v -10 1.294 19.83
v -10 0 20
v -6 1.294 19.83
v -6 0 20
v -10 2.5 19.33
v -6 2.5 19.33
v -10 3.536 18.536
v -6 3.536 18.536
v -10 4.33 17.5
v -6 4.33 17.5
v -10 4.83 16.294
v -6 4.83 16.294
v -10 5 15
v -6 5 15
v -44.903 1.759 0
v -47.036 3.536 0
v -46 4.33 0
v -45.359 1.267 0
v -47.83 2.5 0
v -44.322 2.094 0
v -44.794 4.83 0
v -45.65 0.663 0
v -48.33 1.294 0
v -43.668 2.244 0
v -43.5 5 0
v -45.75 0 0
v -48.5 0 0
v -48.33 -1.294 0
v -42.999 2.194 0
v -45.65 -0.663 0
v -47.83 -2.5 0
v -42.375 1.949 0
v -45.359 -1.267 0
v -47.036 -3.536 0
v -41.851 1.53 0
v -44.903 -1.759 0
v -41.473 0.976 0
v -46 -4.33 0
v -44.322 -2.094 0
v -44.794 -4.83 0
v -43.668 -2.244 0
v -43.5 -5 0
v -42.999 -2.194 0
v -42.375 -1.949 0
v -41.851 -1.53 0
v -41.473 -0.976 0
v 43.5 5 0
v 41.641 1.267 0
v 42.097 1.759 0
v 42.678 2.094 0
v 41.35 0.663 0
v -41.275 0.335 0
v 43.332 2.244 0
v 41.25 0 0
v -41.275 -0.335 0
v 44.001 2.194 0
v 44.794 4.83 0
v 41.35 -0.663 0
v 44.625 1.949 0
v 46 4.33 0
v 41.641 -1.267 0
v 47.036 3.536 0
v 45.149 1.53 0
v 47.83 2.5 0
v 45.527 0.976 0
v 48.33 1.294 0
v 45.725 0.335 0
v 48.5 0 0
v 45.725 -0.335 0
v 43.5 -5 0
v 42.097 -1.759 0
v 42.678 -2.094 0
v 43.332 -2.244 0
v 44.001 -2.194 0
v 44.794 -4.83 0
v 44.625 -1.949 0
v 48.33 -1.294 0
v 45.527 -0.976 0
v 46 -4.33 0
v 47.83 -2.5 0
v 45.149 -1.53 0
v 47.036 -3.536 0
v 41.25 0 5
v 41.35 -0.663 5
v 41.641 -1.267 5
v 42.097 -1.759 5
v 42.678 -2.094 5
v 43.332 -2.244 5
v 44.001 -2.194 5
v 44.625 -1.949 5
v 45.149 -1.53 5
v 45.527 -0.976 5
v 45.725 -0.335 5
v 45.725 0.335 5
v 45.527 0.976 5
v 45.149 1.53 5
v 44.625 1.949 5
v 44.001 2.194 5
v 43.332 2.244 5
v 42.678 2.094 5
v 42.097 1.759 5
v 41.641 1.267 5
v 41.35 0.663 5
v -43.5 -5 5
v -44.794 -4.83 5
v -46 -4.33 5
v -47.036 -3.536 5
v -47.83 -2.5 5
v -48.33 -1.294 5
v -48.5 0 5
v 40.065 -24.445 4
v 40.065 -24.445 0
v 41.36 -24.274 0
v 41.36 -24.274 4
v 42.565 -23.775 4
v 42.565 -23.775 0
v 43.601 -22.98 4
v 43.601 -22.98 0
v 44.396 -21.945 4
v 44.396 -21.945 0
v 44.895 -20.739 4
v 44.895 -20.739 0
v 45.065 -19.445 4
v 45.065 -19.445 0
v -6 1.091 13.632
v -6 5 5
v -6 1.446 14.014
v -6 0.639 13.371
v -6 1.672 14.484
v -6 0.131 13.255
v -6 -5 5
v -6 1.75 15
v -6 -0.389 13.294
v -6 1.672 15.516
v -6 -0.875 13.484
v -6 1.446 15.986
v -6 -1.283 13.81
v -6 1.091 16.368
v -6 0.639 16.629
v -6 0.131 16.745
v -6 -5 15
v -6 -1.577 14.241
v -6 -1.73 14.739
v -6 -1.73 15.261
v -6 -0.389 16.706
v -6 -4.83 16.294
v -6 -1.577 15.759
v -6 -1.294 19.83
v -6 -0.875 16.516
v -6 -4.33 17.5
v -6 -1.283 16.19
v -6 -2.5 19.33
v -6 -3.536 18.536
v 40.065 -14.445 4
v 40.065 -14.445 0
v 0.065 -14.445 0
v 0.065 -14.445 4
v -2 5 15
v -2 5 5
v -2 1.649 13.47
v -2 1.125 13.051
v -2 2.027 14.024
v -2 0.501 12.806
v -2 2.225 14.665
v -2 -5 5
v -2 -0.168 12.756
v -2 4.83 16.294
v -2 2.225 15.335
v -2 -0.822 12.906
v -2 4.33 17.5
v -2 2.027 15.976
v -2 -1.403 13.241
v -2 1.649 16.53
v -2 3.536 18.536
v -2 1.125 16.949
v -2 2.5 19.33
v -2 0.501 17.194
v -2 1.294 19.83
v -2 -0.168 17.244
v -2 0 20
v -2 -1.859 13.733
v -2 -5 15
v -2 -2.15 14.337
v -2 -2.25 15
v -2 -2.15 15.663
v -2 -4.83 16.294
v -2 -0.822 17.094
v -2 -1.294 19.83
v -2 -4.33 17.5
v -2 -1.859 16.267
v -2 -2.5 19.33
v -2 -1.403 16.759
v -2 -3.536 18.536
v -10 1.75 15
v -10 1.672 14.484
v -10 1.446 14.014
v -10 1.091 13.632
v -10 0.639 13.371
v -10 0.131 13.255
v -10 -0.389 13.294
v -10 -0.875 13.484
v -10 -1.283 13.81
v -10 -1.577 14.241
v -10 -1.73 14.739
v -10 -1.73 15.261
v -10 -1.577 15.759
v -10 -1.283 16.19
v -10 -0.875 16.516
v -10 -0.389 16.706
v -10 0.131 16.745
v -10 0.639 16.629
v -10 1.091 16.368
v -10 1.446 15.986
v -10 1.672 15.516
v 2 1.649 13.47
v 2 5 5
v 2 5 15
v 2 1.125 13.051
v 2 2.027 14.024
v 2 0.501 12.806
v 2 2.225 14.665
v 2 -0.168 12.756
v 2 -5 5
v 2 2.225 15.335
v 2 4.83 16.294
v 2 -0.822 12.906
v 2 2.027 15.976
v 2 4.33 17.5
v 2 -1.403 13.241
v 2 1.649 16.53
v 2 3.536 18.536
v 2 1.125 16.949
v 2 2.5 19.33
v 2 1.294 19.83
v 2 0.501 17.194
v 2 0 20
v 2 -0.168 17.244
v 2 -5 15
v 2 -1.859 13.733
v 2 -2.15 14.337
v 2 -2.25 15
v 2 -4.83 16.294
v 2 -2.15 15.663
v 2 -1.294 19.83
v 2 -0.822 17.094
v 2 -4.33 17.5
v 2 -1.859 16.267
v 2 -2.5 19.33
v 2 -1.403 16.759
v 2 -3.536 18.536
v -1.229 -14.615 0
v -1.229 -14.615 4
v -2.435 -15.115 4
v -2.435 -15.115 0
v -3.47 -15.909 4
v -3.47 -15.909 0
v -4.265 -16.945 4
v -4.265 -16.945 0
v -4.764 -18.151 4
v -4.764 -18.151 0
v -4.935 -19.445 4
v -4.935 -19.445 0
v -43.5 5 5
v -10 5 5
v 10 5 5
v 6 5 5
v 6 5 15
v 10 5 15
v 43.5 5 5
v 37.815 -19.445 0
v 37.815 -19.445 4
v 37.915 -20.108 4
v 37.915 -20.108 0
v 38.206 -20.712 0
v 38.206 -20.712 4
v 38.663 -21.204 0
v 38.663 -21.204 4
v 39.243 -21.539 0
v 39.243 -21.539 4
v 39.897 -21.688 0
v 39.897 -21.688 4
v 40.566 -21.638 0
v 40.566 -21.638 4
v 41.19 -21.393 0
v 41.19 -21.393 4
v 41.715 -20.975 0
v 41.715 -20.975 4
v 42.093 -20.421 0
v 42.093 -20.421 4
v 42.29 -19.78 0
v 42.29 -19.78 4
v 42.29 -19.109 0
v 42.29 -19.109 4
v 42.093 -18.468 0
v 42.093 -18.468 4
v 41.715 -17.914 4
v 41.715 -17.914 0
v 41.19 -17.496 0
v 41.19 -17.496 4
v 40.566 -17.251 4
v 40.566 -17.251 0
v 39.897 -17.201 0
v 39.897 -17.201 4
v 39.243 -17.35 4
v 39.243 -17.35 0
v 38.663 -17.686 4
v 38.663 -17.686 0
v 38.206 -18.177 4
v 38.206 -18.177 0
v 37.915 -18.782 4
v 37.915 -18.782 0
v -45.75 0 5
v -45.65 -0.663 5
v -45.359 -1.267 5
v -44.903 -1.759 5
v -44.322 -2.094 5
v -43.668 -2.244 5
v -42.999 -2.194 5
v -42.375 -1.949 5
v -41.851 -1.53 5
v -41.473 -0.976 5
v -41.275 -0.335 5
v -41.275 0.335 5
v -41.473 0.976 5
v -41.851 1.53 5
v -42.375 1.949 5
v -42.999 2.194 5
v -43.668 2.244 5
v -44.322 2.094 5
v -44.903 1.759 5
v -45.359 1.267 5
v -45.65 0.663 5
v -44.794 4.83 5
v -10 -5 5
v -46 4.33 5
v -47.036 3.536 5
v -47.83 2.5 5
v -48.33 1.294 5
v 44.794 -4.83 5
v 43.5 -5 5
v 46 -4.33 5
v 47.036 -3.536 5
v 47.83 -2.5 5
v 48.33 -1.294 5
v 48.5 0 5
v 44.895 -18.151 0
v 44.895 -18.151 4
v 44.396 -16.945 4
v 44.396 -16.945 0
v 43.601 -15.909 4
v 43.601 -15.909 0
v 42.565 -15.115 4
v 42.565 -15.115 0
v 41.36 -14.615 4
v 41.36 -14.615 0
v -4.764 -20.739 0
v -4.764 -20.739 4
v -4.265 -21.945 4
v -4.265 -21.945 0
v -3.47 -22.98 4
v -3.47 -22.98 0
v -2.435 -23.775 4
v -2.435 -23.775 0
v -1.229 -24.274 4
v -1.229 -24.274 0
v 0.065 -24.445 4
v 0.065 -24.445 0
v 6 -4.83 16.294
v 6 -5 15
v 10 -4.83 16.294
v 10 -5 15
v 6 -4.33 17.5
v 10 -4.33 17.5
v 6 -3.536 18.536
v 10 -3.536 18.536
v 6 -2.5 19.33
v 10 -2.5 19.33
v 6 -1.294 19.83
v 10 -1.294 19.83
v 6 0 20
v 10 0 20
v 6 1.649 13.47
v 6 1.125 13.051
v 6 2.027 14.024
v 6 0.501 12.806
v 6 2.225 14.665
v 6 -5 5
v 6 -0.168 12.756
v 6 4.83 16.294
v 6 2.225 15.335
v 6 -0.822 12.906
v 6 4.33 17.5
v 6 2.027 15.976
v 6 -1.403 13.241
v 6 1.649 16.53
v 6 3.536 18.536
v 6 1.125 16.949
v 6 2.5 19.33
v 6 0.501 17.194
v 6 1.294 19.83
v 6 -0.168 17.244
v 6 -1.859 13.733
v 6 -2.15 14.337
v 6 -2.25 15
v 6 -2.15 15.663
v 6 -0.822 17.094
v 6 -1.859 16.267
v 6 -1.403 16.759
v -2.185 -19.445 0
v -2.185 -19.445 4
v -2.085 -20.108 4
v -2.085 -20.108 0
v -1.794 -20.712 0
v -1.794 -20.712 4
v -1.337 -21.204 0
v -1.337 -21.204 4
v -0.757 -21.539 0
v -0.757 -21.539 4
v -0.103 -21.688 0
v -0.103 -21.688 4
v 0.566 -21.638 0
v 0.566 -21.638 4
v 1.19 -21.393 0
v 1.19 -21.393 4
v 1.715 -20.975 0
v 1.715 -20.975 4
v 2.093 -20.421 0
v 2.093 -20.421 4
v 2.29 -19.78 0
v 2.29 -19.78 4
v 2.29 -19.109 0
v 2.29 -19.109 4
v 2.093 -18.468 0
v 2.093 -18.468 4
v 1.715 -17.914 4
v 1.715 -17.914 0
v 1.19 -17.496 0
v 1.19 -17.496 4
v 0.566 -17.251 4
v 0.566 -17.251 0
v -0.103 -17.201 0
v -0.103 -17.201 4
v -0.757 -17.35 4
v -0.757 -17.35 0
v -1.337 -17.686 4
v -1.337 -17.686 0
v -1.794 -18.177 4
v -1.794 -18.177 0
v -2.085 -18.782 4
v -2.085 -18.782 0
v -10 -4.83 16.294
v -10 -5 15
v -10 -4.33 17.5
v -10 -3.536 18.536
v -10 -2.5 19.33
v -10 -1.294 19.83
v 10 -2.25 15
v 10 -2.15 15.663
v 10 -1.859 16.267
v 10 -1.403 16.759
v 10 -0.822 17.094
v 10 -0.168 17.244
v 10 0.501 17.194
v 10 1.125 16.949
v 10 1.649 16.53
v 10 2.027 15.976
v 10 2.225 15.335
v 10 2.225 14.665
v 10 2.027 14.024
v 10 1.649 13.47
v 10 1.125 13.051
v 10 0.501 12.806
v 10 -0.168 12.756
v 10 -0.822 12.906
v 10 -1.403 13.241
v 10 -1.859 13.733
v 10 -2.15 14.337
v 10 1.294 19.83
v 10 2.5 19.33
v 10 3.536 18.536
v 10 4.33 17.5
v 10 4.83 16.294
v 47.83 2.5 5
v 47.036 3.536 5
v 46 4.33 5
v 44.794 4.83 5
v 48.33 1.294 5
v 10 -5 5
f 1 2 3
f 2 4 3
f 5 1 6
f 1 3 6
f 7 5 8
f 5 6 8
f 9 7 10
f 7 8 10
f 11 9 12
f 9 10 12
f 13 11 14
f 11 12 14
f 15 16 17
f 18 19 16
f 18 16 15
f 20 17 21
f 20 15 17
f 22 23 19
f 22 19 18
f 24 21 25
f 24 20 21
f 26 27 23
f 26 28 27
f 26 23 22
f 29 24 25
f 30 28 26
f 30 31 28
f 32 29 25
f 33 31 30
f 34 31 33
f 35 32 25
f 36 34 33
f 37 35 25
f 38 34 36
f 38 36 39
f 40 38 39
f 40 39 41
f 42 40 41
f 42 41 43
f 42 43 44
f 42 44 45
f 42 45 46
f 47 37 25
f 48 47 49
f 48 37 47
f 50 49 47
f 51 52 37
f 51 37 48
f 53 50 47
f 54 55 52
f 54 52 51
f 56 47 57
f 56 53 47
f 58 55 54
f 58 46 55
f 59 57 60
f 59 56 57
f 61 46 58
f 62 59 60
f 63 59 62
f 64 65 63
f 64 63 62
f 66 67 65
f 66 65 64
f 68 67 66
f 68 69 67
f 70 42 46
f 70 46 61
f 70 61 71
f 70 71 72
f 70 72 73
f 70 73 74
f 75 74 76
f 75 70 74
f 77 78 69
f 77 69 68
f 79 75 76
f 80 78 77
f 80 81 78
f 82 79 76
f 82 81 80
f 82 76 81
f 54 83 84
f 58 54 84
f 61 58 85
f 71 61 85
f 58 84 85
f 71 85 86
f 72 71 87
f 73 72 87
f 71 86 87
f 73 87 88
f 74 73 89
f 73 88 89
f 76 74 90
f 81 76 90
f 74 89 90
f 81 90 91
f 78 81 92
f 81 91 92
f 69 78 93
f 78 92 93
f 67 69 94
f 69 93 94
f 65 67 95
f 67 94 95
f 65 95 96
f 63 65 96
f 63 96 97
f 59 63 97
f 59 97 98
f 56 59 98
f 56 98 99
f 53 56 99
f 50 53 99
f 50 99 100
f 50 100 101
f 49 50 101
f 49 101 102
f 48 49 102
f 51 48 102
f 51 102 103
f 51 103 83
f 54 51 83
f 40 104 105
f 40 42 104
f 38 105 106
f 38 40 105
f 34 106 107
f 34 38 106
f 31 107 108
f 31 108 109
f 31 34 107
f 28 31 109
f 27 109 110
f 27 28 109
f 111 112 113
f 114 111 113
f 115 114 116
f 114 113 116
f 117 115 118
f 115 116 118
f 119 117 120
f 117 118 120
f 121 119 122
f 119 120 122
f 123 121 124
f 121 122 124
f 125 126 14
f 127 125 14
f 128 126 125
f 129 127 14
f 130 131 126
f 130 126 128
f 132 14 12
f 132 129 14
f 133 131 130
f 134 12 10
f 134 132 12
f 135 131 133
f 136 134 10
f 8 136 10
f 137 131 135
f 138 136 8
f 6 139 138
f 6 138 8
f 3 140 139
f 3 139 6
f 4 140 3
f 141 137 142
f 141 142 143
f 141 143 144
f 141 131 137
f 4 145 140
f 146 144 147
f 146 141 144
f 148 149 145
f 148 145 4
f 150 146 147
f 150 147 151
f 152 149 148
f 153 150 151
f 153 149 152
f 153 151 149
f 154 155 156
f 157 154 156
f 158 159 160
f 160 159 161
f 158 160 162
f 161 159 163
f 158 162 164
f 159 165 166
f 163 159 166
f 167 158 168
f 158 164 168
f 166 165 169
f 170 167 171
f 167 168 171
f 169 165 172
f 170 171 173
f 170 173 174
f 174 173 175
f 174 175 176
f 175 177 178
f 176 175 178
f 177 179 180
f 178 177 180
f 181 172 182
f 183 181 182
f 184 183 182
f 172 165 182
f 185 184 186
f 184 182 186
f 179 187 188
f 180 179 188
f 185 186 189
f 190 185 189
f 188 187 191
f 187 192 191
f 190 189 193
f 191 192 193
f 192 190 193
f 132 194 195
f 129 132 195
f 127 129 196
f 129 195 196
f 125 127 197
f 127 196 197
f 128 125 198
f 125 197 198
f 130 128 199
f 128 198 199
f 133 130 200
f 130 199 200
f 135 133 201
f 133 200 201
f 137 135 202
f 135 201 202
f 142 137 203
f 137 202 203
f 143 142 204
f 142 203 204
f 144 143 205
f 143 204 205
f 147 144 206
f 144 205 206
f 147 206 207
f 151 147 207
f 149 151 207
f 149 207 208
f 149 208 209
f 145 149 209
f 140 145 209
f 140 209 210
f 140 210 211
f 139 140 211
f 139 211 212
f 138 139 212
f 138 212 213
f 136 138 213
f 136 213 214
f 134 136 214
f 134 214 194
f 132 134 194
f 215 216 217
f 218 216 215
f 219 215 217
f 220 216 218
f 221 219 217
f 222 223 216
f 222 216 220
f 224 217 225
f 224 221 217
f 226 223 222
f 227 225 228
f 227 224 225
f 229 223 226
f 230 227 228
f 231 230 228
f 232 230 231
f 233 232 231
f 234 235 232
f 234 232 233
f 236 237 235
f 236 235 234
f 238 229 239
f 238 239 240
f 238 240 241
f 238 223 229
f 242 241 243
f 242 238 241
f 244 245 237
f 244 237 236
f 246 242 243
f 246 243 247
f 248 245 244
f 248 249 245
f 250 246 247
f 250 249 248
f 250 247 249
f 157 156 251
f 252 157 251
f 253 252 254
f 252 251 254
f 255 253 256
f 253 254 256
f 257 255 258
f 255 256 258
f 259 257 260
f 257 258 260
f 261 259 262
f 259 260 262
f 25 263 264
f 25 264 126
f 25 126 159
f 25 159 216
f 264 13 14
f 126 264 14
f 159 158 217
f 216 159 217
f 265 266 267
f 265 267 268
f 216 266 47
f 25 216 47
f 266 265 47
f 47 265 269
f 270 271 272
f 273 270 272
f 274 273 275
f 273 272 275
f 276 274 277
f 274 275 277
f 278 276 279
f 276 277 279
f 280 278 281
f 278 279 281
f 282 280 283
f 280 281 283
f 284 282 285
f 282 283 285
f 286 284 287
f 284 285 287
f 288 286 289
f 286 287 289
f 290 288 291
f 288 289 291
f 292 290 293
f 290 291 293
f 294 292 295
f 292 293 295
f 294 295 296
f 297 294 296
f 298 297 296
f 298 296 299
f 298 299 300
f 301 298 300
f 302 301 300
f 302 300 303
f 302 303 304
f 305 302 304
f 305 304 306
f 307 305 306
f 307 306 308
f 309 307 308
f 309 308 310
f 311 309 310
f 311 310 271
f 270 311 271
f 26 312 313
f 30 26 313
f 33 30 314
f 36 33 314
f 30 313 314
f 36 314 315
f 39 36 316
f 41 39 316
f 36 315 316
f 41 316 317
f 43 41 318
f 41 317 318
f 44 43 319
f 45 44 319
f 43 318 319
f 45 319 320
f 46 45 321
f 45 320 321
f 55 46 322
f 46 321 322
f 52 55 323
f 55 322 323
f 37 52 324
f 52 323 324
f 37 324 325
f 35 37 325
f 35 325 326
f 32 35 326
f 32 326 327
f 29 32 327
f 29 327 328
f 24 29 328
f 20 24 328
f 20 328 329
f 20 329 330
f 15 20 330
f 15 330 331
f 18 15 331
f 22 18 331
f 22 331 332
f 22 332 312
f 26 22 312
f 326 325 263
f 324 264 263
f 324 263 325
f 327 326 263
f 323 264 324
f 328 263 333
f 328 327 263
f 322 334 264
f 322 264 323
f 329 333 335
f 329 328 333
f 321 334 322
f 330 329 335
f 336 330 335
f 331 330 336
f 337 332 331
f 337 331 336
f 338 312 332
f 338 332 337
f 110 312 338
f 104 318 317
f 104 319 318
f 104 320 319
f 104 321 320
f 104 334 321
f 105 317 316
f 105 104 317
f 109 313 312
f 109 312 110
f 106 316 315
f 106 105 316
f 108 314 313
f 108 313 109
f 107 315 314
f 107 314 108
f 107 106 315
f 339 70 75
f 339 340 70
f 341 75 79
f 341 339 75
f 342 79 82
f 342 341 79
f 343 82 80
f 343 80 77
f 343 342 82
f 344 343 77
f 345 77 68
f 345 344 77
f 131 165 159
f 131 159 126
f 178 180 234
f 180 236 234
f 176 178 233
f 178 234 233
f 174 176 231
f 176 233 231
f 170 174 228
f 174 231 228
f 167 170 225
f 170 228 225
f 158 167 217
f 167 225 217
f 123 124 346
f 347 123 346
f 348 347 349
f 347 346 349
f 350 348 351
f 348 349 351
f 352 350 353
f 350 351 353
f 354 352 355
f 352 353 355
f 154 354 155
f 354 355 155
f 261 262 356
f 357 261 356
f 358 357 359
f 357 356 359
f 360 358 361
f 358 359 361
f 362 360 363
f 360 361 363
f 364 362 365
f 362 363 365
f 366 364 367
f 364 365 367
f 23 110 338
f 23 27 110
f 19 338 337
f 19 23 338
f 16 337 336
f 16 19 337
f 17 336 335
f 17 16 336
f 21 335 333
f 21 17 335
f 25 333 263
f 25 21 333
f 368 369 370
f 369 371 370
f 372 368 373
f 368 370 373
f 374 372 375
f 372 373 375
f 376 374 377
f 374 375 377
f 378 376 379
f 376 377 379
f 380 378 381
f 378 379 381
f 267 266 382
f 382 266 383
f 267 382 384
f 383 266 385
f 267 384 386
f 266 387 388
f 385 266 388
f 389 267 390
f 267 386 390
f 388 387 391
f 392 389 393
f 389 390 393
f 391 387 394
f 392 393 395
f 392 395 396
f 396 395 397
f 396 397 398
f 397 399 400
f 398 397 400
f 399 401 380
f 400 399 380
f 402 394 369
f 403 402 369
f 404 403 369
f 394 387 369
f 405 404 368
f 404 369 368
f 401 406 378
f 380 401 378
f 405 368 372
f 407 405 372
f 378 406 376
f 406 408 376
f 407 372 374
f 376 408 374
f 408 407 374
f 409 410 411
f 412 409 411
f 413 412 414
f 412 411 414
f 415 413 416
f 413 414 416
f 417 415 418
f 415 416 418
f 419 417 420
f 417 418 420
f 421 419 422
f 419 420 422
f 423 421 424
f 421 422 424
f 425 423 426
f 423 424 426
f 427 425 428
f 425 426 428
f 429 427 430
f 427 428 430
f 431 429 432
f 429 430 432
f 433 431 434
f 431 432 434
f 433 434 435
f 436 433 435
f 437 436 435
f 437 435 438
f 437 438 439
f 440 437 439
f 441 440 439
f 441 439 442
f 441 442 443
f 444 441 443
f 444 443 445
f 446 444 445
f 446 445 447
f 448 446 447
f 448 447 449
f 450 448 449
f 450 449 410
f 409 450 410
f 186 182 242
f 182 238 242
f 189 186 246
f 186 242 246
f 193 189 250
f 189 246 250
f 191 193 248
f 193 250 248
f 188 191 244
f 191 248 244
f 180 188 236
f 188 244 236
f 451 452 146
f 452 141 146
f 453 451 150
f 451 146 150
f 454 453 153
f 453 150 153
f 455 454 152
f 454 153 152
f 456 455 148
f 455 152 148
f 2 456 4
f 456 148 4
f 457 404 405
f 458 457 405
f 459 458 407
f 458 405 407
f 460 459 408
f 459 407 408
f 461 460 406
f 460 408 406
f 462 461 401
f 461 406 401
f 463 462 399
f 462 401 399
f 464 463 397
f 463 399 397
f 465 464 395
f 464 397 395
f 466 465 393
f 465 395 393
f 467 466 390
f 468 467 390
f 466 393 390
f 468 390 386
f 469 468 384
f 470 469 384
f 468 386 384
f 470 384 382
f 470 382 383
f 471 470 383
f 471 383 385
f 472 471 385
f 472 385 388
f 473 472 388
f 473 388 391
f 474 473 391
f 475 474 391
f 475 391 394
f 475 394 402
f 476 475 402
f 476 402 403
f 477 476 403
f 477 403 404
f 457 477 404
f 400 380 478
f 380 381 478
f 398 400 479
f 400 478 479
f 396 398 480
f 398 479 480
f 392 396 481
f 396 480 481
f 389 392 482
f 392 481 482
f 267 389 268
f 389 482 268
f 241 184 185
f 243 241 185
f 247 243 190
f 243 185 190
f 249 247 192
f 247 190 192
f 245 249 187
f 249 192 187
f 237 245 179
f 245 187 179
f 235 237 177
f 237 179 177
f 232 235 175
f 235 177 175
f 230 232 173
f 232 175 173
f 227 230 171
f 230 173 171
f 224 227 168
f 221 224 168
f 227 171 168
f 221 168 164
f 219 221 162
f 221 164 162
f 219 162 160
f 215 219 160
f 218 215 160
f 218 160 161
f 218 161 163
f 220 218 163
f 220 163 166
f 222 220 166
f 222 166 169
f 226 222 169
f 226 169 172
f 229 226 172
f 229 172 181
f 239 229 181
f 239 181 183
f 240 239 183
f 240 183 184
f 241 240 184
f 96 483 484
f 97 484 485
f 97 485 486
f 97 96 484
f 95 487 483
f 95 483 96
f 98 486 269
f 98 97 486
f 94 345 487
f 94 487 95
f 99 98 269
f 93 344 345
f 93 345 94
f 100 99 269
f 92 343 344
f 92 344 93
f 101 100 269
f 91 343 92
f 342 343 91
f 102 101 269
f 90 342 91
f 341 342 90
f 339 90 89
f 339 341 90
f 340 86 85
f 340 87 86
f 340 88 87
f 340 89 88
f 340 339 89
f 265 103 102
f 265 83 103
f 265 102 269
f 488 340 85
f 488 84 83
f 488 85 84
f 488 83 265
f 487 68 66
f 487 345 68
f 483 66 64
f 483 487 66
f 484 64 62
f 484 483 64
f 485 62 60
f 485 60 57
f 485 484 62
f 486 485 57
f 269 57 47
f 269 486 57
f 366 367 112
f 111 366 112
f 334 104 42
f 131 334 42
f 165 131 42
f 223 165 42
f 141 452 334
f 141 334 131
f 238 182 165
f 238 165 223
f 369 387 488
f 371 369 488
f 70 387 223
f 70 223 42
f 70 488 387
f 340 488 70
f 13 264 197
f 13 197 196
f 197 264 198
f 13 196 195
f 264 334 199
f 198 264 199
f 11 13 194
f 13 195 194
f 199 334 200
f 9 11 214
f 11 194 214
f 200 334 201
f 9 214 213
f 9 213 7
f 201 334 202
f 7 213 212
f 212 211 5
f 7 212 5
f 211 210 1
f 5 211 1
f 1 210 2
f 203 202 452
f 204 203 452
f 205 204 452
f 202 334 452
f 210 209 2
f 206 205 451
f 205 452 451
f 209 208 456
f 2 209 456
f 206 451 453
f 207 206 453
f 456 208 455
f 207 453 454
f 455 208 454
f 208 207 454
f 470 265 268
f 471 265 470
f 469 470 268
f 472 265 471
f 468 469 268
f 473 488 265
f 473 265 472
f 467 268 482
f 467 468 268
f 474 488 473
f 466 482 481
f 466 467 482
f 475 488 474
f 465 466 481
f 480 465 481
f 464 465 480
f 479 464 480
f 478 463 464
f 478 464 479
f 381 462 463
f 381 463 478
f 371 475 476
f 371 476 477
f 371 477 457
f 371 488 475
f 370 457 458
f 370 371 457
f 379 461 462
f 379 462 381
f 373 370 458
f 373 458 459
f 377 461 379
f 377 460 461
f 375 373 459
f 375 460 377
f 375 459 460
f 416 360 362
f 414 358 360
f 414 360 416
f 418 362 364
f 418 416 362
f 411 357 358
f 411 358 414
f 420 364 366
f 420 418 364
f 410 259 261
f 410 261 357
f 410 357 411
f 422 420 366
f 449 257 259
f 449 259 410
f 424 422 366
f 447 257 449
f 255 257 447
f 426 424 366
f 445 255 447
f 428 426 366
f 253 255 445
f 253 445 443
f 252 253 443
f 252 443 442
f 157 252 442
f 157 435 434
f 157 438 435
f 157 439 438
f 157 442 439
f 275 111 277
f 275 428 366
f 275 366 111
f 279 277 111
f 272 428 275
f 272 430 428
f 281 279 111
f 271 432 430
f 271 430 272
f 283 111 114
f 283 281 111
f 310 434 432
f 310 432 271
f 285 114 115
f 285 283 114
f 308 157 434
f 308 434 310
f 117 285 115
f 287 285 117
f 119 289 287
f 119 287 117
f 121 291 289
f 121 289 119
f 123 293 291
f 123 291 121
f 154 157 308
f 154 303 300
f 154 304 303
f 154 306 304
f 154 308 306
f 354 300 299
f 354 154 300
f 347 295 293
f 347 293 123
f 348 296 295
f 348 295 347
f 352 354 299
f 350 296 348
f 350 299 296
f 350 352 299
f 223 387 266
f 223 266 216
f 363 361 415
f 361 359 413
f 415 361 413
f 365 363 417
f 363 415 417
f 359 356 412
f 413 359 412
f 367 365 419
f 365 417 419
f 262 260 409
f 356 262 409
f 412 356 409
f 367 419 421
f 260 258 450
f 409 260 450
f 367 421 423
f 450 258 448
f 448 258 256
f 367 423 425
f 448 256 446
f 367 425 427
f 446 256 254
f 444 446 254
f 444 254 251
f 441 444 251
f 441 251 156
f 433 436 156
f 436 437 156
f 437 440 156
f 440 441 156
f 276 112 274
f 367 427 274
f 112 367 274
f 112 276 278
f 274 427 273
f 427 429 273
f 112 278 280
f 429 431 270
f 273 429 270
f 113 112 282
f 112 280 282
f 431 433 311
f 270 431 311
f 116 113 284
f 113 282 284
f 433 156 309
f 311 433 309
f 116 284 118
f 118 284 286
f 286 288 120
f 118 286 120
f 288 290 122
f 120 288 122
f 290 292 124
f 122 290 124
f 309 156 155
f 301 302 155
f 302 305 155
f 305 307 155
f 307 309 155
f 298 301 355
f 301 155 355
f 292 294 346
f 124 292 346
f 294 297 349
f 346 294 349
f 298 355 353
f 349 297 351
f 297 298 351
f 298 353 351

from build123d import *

# Parameters (mm, degrees)
F0_W     = 4
F0_H     = 15
F1_DEPTH = 5
F2_R     = 4.99999
F4_D     = 4.5
F6_D     = 4.5
F6_DEPTH = 50.501
F7_D     = 3.5
F9_DEPTH = 4
F10_D    = 4.5


# Not quite as in the source:
# - a fillet or chamfer is up to 0.001 mm smaller than in the source, because OpenCascade refuses the exact size


with BuildPart() as f1:
    # F0 (on Front) → F1 (new body, symmetric)
    with BuildSketch(Plane.XZ):
        with Locations((0, 12.5)):
            Rectangle(F0_W, F0_H)
        with Locations((8, 12.5)):
            Rectangle(F0_W, F0_H)
        with Locations((-8, 12.5)):
            Rectangle(F0_W, F0_H)
        Polygon((-48.5, 5), (-48.5, 0), (48.5, 0), (48.5, 5), (10, 5), (6, 5), (2, 5), (-2, 5), (-6, 5), (-10, 5), align=None)
    extrude(amount=F1_DEPTH, both=True)

    # F2 (radius 5 in the source; OpenCascade refuses exactly that, so slightly less here)
    f2_edges = [f1.edges().sort_by_distance(p)[0] for p in [
        (-48.5, -5, 2.5),
        (-48.5, 5, 2.5),
        (48.5, -5, 2.5),
        (48.5, 5, 2.5),
        (-8, -5, 20),
        (0, -5, 20),
        (8, -5, 20),
        (-8, 5, 20),
        (0, 5, 20),
        (8, 5, 20),
    ]]
    fillet(f2_edges, radius=F2_R)

    # F4 (through all)
    with Locations(Plane(origin=(0, 0, 0), x_dir=(1, 0, 0), z_dir=(0, 0, -1))):
        with Locations((-43.5, 0), (43.5, 0)):
            Hole(F4_D / 2)

    # F6 (through all, one way)
    with BuildSketch(Plane(origin=(-2, 0, 0), x_dir=(0, -1, 0), z_dir=(-1, 0, 0))):
        with Locations((0, 15)):
            Circle(F6_D / 2)
    extrude(amount=-F6_DEPTH, mode=Mode.SUBTRACT)

    # F7 (through all)
    with Locations(Plane(origin=(-2, 0, 0), x_dir=(0, -1, 0), z_dir=(1, 0, 0))):
        with Locations((0, -15)):
            Hole(F7_D / 2)


with BuildPart() as f9:
    # F8 (on Top) → F9 (new body)
    with BuildSketch(Plane.XY):
        with BuildLine():
            Line((40.0654178858, -14.444706738), (0.0654178858, -14.444706738))
            ThreePointArc((0.0654178858, -14.444706738), (-3.4701160202, -15.9091728321), (-4.9345821142, -19.444706738))
            ThreePointArc((-4.9345821142, -19.444706738), (-3.4701160202, -22.9802406439), (0.0654178858, -24.444706738))
            Line((0.0654178858, -24.444706738), (40.0654178858, -24.444706738))
            ThreePointArc((40.0654178858, -24.444706738), (43.6009517917, -22.9802406439), (45.0654178858, -19.444706738))
            ThreePointArc((45.0654178858, -19.444706738), (43.6009517917, -15.9091728321), (40.0654178858, -14.444706738))
        make_face()
    extrude(amount=F9_DEPTH)

    # F10 (through all)
    with Locations(Plane(origin=(0, 0, 0), x_dir=(1, 0, 0), z_dir=(0, 0, -1))):
        with Locations((0.0654178858, 19.444706738), (40.0654178858, 19.444706738)):
            Hole(F10_D / 2)


solid = Compound([f1.part, f9.part])
